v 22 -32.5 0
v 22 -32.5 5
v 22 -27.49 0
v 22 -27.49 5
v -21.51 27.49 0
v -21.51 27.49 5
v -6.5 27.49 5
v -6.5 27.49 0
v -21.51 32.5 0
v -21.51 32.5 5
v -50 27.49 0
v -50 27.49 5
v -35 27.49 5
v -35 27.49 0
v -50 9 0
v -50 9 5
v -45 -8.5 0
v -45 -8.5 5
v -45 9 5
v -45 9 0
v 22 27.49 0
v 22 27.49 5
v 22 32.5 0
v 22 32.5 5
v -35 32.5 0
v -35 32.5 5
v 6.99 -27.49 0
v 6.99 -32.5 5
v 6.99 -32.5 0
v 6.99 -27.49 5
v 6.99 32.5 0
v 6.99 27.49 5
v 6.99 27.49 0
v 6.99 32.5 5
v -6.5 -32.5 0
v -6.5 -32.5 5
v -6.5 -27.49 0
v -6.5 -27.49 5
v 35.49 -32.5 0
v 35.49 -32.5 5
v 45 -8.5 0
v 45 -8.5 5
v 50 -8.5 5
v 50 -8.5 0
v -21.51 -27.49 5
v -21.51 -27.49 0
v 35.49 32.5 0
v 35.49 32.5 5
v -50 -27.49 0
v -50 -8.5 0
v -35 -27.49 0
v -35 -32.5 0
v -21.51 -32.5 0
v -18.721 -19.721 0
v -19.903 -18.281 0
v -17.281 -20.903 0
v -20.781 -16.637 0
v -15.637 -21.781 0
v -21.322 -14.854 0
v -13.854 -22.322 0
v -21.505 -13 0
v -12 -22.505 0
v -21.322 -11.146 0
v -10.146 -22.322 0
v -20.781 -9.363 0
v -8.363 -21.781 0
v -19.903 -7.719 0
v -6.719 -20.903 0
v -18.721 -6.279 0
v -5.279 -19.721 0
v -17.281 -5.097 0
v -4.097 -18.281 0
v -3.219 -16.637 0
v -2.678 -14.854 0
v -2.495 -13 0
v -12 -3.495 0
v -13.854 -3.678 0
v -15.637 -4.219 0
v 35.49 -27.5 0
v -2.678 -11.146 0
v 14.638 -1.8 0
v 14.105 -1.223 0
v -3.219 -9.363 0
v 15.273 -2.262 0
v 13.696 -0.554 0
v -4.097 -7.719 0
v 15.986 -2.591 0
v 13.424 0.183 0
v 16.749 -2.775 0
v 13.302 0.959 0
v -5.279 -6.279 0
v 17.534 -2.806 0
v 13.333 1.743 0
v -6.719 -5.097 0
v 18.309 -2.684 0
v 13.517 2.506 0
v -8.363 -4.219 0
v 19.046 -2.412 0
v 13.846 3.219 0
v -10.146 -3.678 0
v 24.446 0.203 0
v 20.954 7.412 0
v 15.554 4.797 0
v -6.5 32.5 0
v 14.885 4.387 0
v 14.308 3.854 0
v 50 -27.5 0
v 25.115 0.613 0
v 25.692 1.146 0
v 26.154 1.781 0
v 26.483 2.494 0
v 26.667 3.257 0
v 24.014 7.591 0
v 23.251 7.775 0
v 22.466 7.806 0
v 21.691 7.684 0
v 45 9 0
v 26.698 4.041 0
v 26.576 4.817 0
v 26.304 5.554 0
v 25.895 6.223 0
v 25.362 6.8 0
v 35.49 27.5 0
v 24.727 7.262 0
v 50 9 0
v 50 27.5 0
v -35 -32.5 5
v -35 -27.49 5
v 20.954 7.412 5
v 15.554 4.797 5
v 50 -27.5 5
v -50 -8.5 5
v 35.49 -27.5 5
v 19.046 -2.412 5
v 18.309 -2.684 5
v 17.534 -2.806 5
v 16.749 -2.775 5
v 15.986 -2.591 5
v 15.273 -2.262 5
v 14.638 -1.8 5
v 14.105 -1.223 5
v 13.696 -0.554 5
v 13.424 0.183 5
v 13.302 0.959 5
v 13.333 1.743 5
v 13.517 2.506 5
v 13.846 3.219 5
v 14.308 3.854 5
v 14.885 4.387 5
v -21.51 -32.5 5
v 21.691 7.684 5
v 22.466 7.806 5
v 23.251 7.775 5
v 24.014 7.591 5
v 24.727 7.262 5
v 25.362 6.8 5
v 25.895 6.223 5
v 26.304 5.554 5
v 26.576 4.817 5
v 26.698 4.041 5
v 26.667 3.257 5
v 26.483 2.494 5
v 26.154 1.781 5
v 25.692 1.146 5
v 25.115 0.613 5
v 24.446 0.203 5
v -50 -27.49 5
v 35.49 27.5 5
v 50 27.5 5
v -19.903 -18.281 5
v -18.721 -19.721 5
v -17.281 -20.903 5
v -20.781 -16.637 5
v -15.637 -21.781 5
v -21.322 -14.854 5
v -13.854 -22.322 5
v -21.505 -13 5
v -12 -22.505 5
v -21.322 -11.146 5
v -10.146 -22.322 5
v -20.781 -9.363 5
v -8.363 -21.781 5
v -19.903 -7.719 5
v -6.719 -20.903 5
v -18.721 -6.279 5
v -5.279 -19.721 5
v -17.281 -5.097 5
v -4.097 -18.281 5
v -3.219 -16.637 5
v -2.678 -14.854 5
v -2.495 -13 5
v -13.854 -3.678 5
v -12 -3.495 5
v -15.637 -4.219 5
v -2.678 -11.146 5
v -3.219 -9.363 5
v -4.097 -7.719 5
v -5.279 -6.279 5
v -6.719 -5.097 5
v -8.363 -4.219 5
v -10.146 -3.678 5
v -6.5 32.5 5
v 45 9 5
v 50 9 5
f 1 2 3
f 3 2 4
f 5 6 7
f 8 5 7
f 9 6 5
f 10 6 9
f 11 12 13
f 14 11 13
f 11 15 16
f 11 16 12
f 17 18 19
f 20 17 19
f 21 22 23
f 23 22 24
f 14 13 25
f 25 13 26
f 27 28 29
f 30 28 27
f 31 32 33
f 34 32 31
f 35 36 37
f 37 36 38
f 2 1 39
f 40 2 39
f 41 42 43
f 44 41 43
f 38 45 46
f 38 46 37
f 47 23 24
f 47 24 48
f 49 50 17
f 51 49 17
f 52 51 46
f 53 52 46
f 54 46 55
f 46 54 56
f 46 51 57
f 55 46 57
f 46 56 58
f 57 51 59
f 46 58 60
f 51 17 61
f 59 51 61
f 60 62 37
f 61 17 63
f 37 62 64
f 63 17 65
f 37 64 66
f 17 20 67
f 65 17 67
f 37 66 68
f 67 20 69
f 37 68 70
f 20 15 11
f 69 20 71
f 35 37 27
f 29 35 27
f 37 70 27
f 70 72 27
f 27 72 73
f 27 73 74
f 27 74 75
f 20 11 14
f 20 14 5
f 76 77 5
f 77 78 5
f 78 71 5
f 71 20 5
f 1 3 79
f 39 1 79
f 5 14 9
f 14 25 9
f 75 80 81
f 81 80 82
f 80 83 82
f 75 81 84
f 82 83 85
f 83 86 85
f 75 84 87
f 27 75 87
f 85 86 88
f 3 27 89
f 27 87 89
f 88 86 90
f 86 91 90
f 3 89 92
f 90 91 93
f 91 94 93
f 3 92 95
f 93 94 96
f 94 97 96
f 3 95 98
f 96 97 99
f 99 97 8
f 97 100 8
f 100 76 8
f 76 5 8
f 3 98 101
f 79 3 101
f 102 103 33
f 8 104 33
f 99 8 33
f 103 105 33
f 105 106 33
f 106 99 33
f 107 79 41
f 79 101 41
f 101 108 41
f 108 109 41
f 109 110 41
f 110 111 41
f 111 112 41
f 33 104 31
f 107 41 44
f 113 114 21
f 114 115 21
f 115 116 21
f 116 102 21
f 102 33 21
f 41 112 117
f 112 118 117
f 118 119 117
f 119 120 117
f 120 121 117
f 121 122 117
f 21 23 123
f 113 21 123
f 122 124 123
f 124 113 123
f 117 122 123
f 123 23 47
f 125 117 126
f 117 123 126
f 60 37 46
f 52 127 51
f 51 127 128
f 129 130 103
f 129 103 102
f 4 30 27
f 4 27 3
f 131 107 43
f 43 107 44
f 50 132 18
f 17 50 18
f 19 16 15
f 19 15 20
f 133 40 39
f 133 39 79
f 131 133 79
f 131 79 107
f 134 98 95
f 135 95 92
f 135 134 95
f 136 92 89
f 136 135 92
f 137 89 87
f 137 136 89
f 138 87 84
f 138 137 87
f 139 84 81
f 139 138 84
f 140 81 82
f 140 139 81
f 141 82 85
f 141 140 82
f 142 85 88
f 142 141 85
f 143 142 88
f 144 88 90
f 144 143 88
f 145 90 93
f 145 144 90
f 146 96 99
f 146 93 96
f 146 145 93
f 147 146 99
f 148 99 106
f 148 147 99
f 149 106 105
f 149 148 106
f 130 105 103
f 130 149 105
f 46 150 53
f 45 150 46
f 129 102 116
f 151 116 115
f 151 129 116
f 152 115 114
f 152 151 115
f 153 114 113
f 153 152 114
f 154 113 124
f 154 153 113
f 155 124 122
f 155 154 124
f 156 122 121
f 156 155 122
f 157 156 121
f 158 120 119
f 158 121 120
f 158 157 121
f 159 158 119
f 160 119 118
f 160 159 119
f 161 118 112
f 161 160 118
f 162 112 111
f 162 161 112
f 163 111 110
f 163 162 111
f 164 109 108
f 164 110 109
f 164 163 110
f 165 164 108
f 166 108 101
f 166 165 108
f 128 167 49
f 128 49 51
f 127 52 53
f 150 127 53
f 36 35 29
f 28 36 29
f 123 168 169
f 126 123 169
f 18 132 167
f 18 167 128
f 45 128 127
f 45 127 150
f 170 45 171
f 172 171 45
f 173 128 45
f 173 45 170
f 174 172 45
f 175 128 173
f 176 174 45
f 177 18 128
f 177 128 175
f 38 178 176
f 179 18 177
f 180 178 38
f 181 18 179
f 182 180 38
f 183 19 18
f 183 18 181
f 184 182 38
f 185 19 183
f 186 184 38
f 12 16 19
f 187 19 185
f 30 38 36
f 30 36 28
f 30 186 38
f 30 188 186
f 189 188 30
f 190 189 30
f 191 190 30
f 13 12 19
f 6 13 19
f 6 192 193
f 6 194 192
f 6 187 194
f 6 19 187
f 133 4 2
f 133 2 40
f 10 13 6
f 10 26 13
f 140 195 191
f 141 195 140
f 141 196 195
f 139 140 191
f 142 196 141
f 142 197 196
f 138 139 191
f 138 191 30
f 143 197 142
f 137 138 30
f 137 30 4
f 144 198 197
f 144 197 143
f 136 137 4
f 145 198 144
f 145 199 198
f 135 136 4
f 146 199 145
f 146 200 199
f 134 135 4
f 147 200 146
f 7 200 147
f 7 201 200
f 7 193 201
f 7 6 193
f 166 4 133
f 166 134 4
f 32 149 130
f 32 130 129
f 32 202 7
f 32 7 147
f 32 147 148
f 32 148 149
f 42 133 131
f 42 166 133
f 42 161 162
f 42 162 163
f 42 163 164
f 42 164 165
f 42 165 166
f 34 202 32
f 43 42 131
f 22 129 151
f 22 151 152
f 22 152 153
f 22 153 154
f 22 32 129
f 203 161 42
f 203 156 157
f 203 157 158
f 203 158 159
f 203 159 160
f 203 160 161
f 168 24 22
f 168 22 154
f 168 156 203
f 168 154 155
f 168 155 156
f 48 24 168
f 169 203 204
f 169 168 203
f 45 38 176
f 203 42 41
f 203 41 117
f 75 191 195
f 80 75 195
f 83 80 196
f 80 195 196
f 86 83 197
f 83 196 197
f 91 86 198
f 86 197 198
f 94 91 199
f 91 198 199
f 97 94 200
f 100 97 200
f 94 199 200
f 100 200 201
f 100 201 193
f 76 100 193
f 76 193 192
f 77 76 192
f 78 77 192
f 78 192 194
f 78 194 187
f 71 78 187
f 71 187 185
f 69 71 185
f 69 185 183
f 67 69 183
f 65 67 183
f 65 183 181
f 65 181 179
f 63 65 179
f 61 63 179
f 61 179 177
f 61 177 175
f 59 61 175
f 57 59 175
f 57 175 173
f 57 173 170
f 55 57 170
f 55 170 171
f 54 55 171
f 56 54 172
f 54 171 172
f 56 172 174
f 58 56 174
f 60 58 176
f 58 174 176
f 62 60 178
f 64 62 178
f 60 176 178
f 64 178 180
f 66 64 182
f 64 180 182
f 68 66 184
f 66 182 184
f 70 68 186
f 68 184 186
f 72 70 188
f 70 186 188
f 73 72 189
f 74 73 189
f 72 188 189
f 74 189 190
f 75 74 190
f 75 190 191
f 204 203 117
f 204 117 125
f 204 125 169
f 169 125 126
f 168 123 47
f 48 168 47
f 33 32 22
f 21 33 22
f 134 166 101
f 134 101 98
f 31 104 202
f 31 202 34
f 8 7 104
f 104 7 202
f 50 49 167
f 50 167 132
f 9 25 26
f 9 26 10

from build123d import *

# Parameters (mm, degrees)
ESQUISSE1_W             = 100
ESQUISSE1_H             = 65
BOSS_EXTRU_1_DEPTH      = 5
ESQUISSE2_W             = 15
ESQUISSE2_H             = 5.01
ESQUISSE2_W_2           = 15.01
ESQUISSE2_W_3           = 14.51
ESQUISSE2_W_4           = 5
ESQUISSE2_H_2           = 17.5
ENL_V_MAT_EXTRU_1_DEPTH = 5
ESQUISSE3_R             = 9.505
ENL_V_MAT_EXTRU_2_DEPTH = 10
ENL_V_MAT_EXTRU_3_DEPTH = 10


with BuildPart() as part:
    # Esquisse1 → Boss.-Extru.1 (new body)
    with BuildSketch(Plane.XY):
        Rectangle(ESQUISSE1_W, ESQUISSE1_H)
    extrude(amount=BOSS_EXTRU_1_DEPTH)

    # Esquisse2 → Enlèv. mat.-Extru.1 (cut)
    with BuildSketch(Plane.XY.offset(5)):
        with Locations((-42.5, 29.995)):
            Rectangle(ESQUISSE2_W, ESQUISSE2_H)
        with Locations((-14.005, 29.995)):
            Rectangle(ESQUISSE2_W_2, ESQUISSE2_H)
        with Locations((14.495, 29.995)):
            Rectangle(ESQUISSE2_W_2, ESQUISSE2_H)
        with Locations((42.745, 30.005)):
            Rectangle(ESQUISSE2_W_3, ESQUISSE2_H)
        with Locations((-47.5, 0.25)):
            Rectangle(ESQUISSE2_W_4, ESQUISSE2_H_2)
        with Locations((47.5, 0.25)):
            Rectangle(ESQUISSE2_W_4, ESQUISSE2_H_2)
        with Locations((42.745, -30.005)):
            Rectangle(ESQUISSE2_W_3, ESQUISSE2_H)
        with Locations((14.495, -29.995)):
            Rectangle(ESQUISSE2_W_2, ESQUISSE2_H)
        with Locations((-14.005, -29.995)):
            Rectangle(ESQUISSE2_W_2, ESQUISSE2_H)
        with Locations((-42.5, -29.995)):
            Rectangle(ESQUISSE2_W, ESQUISSE2_H)
    extrude(amount=-ENL_V_MAT_EXTRU_1_DEPTH, mode=Mode.SUBTRACT)

    # Esquisse3 → Enlèv. mat.-Extru.2 (cut)
    with BuildSketch(Plane.XY.offset(5)):
        with Locations((-12, -13)):
            Circle(ESQUISSE3_R)
    extrude(amount=-ENL_V_MAT_EXTRU_2_DEPTH, mode=Mode.SUBTRACT)

    # Esquisse4 → Enlèv. mat.-Extru.3 (cut)
    with BuildSketch(Plane.XY.offset(5)):
        with BuildLine():
            Line((24.445837429, 0.203360159), (19.045949486, -2.412210563))
            ThreePointArc((19.045949486, -2.412210563), (13.695630827, -0.553678818), (15.554162571, 4.796639841))
            Line((15.554162571, 4.796639841), (20.954050514, 7.412210563))
            ThreePointArc((20.954050514, 7.412210563), (26.304369173, 5.553678818), (24.445837429, 0.203360159))
        make_face()
    extrude(amount=-ENL_V_MAT_EXTRU_3_DEPTH, mode=Mode.SUBTRACT)


solid = part.part
